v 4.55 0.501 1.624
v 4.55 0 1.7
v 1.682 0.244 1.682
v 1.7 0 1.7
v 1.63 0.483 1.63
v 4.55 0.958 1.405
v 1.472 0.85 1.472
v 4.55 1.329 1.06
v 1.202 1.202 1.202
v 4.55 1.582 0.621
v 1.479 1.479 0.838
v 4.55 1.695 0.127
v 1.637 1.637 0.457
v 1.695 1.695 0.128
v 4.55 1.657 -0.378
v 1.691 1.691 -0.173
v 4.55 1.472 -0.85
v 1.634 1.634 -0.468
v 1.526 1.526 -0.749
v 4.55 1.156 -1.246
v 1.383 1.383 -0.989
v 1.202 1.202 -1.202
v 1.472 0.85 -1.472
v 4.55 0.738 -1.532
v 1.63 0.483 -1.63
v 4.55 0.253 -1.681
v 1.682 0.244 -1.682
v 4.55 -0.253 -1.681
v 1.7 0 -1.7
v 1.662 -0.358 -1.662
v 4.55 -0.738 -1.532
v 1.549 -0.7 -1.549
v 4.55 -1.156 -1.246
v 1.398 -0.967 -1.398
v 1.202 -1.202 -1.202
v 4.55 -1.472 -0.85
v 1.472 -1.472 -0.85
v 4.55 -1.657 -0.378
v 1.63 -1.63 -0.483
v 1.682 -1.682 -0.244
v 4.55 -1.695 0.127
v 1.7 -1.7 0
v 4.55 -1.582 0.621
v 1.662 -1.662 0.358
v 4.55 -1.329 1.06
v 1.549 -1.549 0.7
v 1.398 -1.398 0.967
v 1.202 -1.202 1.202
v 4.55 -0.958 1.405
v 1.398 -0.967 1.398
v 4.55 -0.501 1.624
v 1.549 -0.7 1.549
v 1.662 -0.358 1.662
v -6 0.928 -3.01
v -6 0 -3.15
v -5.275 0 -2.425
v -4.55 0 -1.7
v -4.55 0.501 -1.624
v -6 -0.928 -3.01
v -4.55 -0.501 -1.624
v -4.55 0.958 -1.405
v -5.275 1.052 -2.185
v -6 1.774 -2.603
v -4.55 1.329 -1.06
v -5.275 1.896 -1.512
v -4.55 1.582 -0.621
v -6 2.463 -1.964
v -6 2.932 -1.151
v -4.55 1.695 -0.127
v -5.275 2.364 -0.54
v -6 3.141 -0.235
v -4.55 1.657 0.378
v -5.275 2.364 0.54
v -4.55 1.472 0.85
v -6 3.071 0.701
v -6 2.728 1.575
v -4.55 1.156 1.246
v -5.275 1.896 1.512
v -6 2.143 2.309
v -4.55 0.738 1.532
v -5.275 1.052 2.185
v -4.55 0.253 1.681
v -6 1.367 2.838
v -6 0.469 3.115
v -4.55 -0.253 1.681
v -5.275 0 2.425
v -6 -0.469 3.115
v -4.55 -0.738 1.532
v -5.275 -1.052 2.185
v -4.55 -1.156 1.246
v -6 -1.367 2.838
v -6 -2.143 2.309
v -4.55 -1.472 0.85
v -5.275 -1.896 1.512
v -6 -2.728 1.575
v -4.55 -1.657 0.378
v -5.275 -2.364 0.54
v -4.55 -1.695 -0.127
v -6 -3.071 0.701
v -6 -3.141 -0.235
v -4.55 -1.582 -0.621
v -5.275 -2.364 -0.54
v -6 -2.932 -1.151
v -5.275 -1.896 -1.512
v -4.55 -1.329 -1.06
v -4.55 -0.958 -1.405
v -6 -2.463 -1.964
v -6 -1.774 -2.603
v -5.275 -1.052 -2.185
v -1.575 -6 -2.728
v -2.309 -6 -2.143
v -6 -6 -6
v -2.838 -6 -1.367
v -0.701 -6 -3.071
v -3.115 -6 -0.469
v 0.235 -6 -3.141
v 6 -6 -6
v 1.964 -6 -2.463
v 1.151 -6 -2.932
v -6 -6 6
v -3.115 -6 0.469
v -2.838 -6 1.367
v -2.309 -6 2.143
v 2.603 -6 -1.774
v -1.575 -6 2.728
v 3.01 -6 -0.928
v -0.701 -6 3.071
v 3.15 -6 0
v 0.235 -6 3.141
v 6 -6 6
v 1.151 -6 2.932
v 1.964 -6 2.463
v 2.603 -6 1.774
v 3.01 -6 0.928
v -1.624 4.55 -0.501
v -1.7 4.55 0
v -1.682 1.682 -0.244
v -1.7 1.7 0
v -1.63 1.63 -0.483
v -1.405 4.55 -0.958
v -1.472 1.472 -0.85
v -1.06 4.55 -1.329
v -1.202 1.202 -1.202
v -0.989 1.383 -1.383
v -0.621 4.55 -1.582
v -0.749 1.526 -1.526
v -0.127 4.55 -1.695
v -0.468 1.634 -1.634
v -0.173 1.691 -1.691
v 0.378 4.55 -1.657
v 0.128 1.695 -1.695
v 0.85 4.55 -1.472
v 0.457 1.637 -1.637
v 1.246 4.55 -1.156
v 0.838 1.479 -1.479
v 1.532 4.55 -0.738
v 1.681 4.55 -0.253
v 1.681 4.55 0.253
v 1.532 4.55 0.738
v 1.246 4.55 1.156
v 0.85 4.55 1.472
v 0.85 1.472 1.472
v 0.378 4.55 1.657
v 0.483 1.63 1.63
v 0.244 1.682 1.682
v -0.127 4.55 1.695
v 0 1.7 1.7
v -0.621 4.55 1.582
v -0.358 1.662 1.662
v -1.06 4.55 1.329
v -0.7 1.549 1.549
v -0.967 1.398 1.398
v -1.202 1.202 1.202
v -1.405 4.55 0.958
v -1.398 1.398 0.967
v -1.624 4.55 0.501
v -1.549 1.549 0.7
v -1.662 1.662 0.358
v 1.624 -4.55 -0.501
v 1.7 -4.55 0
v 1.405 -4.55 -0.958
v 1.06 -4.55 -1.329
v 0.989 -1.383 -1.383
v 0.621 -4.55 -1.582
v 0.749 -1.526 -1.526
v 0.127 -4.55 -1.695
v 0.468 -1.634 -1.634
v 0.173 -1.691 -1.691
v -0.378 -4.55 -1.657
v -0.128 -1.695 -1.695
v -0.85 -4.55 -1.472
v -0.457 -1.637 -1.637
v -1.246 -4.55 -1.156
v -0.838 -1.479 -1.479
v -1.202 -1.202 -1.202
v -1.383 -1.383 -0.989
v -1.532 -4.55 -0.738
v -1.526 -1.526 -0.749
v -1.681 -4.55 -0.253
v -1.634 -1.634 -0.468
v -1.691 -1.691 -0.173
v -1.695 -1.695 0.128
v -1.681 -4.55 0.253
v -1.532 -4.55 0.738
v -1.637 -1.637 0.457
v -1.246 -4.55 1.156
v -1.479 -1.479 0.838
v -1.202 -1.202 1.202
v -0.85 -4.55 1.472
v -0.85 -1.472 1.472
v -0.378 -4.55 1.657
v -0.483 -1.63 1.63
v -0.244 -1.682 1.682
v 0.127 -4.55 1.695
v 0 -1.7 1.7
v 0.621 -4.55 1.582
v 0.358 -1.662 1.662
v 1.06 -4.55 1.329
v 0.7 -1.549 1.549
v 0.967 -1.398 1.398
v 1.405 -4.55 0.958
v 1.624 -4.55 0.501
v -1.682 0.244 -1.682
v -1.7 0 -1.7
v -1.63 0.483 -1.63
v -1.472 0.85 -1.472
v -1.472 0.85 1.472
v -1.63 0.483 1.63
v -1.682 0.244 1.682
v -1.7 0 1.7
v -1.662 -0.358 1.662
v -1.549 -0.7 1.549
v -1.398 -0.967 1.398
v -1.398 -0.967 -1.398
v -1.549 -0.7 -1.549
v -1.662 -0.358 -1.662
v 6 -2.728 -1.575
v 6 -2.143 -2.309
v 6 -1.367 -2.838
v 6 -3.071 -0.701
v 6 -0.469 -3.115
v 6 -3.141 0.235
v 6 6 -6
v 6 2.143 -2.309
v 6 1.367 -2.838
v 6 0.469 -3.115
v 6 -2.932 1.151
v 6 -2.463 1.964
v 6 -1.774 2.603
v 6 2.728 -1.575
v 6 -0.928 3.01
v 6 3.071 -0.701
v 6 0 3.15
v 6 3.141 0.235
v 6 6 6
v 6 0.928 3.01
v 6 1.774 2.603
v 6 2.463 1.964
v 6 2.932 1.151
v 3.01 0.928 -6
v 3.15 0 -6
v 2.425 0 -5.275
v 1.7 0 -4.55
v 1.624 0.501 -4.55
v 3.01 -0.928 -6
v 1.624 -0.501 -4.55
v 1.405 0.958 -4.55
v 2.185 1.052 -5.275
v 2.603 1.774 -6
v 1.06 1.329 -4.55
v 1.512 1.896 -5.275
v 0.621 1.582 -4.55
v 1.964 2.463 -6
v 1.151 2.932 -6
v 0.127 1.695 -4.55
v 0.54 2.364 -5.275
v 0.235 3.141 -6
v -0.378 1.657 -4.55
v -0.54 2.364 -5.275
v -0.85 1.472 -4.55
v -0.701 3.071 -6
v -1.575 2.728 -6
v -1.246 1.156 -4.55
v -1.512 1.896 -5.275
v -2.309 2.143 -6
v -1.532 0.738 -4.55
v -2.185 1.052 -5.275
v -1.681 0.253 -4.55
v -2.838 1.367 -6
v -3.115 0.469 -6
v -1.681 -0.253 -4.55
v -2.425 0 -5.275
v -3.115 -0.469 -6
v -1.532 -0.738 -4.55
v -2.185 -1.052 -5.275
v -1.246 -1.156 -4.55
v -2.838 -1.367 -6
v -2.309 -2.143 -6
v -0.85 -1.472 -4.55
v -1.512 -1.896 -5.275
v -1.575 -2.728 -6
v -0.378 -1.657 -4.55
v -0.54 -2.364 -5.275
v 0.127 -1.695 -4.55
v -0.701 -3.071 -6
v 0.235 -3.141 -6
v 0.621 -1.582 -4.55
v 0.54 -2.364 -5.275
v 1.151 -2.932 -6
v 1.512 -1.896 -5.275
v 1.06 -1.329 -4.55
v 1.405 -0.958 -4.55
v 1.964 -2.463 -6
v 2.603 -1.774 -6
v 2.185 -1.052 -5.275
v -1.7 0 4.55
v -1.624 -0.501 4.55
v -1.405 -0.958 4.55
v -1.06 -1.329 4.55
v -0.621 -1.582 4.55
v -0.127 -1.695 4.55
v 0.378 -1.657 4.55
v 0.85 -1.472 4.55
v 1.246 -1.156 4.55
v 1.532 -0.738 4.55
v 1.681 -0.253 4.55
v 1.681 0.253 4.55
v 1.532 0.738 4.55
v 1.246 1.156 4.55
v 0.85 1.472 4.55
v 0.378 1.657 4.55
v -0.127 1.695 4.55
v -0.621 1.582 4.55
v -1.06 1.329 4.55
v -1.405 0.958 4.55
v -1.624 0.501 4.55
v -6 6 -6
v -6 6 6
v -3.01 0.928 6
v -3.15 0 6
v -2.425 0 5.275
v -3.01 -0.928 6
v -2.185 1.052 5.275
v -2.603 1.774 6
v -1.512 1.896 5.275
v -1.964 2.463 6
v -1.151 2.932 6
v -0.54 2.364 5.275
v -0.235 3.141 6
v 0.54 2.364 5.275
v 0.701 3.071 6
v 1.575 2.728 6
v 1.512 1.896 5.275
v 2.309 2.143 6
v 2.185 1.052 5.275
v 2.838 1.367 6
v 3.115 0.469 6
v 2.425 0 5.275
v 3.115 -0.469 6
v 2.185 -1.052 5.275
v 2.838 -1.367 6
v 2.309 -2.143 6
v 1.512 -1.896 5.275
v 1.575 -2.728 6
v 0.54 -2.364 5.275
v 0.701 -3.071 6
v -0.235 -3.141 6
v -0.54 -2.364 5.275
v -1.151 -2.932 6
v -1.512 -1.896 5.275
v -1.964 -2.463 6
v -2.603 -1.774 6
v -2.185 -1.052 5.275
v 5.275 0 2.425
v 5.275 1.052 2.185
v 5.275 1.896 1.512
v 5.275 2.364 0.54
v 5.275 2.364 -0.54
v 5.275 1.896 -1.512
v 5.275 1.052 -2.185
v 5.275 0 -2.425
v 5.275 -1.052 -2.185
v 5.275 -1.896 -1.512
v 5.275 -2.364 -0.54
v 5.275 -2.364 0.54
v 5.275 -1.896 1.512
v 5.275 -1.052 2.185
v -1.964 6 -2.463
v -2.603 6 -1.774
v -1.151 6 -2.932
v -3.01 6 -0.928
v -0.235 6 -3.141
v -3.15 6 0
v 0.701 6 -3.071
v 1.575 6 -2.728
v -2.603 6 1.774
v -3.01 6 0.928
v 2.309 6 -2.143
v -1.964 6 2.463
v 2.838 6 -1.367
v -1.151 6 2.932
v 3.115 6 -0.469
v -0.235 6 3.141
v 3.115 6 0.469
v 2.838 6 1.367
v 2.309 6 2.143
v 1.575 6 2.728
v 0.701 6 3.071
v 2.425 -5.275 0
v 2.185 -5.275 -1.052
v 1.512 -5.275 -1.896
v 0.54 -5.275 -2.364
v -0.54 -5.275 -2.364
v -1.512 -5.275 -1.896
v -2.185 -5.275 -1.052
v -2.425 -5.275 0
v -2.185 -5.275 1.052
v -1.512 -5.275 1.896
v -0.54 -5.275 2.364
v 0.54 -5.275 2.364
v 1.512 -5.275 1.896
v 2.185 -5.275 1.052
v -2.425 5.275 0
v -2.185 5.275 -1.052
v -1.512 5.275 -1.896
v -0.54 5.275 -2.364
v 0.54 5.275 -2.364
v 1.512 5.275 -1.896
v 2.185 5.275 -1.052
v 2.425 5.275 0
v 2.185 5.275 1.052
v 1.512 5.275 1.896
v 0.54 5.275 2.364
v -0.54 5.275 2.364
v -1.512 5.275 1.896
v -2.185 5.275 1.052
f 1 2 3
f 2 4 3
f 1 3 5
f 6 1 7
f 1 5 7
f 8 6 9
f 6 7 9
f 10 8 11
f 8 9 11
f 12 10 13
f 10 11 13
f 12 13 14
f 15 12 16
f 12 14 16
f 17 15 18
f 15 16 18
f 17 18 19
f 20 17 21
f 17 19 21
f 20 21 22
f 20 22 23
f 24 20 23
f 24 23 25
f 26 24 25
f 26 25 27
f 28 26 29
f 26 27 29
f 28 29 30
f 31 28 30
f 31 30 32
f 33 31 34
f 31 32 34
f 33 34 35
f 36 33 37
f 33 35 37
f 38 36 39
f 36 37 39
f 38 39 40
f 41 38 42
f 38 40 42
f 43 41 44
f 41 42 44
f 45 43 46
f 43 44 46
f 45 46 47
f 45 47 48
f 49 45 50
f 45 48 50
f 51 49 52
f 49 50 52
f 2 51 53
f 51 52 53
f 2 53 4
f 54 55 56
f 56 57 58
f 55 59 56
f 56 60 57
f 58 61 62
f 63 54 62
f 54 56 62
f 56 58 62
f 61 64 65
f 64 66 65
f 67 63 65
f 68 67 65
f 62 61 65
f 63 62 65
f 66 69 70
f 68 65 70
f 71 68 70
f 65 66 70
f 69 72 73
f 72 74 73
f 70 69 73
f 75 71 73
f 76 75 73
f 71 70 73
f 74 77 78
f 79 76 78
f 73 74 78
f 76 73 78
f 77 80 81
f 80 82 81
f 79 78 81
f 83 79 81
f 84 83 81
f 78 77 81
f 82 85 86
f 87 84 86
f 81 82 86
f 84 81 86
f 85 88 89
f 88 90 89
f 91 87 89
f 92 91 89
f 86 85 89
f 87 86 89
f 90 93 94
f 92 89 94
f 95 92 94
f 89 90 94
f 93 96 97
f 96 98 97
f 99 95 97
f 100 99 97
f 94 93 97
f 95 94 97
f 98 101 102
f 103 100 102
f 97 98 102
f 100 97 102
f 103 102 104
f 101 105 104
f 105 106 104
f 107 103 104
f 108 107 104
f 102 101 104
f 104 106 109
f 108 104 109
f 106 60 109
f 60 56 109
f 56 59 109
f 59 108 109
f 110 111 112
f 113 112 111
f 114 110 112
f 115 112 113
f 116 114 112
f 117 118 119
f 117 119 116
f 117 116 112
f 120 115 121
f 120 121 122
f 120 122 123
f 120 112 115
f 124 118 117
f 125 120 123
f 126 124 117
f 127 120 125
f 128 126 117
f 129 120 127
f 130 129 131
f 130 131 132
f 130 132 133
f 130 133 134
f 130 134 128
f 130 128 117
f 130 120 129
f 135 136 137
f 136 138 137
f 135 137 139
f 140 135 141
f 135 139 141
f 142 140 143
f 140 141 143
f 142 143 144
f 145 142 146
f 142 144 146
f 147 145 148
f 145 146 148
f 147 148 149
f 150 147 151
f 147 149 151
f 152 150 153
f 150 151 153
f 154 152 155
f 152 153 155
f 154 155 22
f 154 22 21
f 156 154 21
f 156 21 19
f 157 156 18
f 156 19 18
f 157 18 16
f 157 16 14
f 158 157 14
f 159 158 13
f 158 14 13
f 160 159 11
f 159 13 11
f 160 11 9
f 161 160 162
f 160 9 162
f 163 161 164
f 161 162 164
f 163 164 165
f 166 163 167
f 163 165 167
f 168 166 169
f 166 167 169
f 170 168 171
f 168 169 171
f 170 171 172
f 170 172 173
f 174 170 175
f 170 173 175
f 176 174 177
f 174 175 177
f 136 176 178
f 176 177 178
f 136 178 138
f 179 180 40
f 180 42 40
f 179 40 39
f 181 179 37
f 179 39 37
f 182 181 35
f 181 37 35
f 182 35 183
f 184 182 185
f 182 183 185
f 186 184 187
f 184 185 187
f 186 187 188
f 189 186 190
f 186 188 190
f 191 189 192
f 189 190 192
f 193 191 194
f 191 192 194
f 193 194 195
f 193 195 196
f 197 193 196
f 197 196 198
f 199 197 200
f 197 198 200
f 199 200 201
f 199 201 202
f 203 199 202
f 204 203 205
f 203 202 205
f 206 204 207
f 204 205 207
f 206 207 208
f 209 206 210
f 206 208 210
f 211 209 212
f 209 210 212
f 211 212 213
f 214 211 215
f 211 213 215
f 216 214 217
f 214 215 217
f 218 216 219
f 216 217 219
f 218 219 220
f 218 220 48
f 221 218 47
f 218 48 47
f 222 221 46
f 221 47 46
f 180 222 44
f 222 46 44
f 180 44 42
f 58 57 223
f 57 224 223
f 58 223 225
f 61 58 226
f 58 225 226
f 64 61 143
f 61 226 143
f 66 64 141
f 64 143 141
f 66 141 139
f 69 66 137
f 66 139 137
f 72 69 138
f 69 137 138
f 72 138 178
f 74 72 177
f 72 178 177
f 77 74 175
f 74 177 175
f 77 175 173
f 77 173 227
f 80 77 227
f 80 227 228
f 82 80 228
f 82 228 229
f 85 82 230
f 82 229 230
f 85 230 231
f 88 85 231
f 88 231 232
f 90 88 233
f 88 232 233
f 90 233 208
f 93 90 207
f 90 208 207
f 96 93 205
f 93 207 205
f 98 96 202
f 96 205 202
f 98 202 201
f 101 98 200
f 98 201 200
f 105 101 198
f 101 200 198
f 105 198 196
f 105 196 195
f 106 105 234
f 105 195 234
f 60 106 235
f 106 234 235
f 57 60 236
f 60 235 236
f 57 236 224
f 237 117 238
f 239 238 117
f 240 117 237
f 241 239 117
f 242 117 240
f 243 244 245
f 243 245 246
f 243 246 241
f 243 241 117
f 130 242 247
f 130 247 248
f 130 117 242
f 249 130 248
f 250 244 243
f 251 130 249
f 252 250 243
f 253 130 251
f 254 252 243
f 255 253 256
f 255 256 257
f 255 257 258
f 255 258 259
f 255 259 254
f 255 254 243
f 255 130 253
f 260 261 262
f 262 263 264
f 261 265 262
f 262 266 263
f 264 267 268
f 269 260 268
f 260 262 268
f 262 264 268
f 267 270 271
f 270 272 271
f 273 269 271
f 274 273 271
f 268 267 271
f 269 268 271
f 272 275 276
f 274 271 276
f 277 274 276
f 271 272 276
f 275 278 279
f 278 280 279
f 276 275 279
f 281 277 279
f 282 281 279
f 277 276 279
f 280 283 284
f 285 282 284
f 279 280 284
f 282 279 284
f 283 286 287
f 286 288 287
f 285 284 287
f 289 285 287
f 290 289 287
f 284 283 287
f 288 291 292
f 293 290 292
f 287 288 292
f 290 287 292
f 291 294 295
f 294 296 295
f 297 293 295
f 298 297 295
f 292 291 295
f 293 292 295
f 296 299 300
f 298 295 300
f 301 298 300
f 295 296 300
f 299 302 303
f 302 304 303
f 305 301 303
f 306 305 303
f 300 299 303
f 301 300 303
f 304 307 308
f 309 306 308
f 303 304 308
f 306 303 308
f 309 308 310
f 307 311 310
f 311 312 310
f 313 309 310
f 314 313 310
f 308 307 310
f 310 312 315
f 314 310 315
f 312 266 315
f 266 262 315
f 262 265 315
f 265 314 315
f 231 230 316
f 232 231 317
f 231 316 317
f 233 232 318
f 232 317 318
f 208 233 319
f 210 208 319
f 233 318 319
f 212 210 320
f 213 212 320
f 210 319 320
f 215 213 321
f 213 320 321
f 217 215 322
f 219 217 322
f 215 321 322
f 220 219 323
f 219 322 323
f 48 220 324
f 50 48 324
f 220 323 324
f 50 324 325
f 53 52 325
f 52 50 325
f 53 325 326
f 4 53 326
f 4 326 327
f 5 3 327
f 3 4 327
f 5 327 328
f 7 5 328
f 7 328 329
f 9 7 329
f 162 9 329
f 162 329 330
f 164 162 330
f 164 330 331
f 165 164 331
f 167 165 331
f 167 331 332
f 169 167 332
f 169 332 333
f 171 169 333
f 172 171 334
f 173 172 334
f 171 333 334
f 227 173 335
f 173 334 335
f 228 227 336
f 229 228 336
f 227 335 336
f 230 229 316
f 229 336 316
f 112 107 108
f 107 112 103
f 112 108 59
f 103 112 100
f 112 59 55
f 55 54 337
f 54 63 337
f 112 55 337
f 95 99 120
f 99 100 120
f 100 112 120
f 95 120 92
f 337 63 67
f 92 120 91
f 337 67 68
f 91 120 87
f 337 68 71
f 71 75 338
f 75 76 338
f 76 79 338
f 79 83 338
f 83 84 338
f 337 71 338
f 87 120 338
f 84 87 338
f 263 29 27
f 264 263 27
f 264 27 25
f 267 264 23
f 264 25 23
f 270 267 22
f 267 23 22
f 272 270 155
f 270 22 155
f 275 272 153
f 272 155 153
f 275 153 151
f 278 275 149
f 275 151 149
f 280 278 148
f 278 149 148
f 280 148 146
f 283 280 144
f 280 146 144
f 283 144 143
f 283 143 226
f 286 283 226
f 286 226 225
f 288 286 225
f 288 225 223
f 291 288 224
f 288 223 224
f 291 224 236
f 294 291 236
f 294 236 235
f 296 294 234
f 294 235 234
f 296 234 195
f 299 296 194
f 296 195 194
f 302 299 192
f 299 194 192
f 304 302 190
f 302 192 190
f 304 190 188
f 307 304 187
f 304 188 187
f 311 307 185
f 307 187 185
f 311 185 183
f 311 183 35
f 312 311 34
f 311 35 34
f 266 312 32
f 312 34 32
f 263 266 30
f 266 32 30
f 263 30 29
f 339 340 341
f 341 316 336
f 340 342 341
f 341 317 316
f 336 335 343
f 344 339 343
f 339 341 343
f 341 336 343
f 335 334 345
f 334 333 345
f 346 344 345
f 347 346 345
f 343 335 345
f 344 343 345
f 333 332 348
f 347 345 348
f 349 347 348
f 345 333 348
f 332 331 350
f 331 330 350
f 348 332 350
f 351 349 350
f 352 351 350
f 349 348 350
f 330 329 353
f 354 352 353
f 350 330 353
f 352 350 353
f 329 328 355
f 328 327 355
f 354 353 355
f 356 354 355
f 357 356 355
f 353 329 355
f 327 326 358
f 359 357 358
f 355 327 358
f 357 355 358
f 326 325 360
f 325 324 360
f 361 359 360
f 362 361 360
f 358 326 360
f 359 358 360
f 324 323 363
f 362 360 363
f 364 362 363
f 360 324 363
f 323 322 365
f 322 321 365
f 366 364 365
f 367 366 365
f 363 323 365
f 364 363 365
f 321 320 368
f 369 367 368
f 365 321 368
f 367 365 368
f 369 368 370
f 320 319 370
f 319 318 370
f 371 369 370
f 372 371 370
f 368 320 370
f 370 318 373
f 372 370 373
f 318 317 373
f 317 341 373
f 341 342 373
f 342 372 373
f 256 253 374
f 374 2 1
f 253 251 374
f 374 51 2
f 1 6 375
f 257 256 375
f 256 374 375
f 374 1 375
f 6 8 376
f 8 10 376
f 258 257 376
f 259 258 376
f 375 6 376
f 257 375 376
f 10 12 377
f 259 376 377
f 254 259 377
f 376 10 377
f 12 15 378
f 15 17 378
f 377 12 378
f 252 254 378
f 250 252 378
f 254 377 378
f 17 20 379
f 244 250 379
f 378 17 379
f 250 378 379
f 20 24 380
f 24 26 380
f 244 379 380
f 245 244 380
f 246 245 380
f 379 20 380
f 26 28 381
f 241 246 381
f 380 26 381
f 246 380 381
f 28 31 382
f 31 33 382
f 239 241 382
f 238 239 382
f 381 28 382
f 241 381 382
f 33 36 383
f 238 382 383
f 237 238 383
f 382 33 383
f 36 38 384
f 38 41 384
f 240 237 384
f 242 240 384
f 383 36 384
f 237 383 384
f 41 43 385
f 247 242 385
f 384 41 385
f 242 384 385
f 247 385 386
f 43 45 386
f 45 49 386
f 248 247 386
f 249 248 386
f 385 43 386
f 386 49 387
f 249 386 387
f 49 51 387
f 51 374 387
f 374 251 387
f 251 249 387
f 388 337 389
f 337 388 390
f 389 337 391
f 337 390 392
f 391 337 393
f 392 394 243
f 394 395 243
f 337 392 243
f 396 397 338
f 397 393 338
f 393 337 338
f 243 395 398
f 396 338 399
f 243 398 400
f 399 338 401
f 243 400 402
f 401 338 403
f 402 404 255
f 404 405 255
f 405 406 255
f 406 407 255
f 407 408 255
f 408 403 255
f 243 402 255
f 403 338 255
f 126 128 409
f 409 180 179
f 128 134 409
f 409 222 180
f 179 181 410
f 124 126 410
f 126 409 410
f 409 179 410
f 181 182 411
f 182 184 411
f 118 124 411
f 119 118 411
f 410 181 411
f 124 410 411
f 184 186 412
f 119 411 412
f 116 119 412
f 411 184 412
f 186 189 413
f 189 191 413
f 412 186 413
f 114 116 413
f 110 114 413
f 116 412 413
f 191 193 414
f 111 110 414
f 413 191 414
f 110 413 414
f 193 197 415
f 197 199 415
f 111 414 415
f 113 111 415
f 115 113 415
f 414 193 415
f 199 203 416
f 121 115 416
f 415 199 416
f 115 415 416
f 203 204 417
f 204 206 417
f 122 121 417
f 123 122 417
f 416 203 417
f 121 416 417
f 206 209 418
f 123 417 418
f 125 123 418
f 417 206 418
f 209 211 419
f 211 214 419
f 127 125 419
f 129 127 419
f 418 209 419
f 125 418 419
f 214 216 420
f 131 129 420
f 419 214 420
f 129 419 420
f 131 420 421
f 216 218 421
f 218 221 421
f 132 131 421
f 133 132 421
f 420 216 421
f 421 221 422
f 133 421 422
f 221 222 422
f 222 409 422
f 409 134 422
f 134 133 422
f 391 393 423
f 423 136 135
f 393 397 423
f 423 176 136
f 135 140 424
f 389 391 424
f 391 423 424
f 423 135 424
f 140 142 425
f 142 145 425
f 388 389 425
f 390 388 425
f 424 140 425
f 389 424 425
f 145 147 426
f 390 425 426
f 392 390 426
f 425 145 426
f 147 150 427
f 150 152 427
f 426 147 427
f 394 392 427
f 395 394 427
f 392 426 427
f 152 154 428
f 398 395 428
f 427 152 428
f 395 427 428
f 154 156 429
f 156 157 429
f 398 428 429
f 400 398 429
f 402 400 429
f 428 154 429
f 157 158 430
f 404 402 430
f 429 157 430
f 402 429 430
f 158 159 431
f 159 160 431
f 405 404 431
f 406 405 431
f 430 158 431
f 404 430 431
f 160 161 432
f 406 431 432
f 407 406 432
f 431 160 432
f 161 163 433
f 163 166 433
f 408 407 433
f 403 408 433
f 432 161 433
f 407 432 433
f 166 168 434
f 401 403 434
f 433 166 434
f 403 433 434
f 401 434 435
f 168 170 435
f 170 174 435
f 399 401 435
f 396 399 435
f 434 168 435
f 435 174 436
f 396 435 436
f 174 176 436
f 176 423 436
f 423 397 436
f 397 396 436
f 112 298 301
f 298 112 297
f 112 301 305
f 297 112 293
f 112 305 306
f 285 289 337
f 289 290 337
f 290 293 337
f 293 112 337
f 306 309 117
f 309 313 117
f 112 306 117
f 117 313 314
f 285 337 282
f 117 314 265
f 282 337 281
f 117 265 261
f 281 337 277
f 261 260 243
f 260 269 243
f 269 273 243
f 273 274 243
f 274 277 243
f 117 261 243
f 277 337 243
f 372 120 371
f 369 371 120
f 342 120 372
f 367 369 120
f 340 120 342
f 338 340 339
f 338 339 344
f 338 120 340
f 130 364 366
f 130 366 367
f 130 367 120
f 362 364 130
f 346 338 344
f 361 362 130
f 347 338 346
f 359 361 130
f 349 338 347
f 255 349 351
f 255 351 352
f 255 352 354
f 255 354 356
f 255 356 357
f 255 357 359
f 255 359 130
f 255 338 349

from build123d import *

# Parameters (mm, degrees)
SKETCH1_W                                       = 12
SKETCH1_H                                       = 12
BOSS_EXTRUDE1_DEPTH                             = 6
CSK_FOR_M3_FLAT_HEAD_MACHINE_SCREW1_D           = 3.4
CSK_FOR_M3_FLAT_HEAD_MACHINE_SCREW1_DEPTH       = 6
CSK_FOR_M3_FLAT_HEAD_MACHINE_SCREW1_CSINK_D     = 6.3
CSK_FOR_M3_FLAT_HEAD_MACHINE_SCREW1_CSINK_ANGLE = 90
CSK_FOR_M3_FLAT_HEAD_MACHINE_SCREW1_TIP         = 1.021463052
CSK_FOR_M3_FLAT_HEAD_MACHINE_SCREW2_D           = 3.4
CSK_FOR_M3_FLAT_HEAD_MACHINE_SCREW2_DEPTH       = 6
CSK_FOR_M3_FLAT_HEAD_MACHINE_SCREW2_CSINK_D     = 6.3
CSK_FOR_M3_FLAT_HEAD_MACHINE_SCREW2_CSINK_ANGLE = 90
CSK_FOR_M3_FLAT_HEAD_MACHINE_SCREW2_TIP         = 1.021463052
CSK_FOR_M3_FLAT_HEAD_MACHINE_SCREW3_D           = 3.4
CSK_FOR_M3_FLAT_HEAD_MACHINE_SCREW3_DEPTH       = 6
CSK_FOR_M3_FLAT_HEAD_MACHINE_SCREW3_CSINK_D     = 6.3
CSK_FOR_M3_FLAT_HEAD_MACHINE_SCREW3_CSINK_ANGLE = 90
CSK_FOR_M3_FLAT_HEAD_MACHINE_SCREW3_TIP         = 1.021463052
CSK_FOR_M3_FLAT_HEAD_MACHINE_SCREW7_D           = 3.4
CSK_FOR_M3_FLAT_HEAD_MACHINE_SCREW7_DEPTH       = 6
CSK_FOR_M3_FLAT_HEAD_MACHINE_SCREW7_CSINK_D     = 6.3
CSK_FOR_M3_FLAT_HEAD_MACHINE_SCREW7_CSINK_ANGLE = 90
CSK_FOR_M3_FLAT_HEAD_MACHINE_SCREW7_TIP         = 1.021463052
CSK_FOR_M3_FLAT_HEAD_MACHINE_SCREW8_D           = 3.4
CSK_FOR_M3_FLAT_HEAD_MACHINE_SCREW8_DEPTH       = 6
CSK_FOR_M3_FLAT_HEAD_MACHINE_SCREW8_CSINK_D     = 6.3
CSK_FOR_M3_FLAT_HEAD_MACHINE_SCREW8_CSINK_ANGLE = 90
CSK_FOR_M3_FLAT_HEAD_MACHINE_SCREW8_TIP         = 1.021463052
CSK_FOR_M3_FLAT_HEAD_MACHINE_SCREW9_D           = 3.4
CSK_FOR_M3_FLAT_HEAD_MACHINE_SCREW9_DEPTH       = 6
CSK_FOR_M3_FLAT_HEAD_MACHINE_SCREW9_CSINK_D     = 6.3
CSK_FOR_M3_FLAT_HEAD_MACHINE_SCREW9_CSINK_ANGLE = 90
CSK_FOR_M3_FLAT_HEAD_MACHINE_SCREW9_TIP         = 1.021463052


with BuildPart() as part:
    # Sketch1 → Boss-Extrude1 (new, symmetric)
    with BuildSketch(Plane.XY):
        Rectangle(SKETCH1_W, SKETCH1_H)
    extrude(amount=BOSS_EXTRUDE1_DEPTH, both=True)

    # CSK for M3 Flat Head Machine Screw1
    with Locations(Plane.XY.offset(6)):
        with Locations((0, 0)):
            CounterSinkHole(CSK_FOR_M3_FLAT_HEAD_MACHINE_SCREW1_D / 2, CSK_FOR_M3_FLAT_HEAD_MACHINE_SCREW1_CSINK_D / 2, depth=CSK_FOR_M3_FLAT_HEAD_MACHINE_SCREW1_DEPTH, counter_sink_angle=CSK_FOR_M3_FLAT_HEAD_MACHINE_SCREW1_CSINK_ANGLE)
            with Locations((0, 0, -(CSK_FOR_M3_FLAT_HEAD_MACHINE_SCREW1_DEPTH + CSK_FOR_M3_FLAT_HEAD_MACHINE_SCREW1_TIP / 2))):  # 118° drill point
                Cone(0, CSK_FOR_M3_FLAT_HEAD_MACHINE_SCREW1_D / 2, CSK_FOR_M3_FLAT_HEAD_MACHINE_SCREW1_TIP, mode=Mode.SUBTRACT)

    # CSK for M3 Flat Head Machine Screw2
    with Locations(Plane(origin=(6, 0, 0), x_dir=(0, 0, -1), z_dir=(1, 0, 0))):
        with Locations((0, 0)):
            CounterSinkHole(CSK_FOR_M3_FLAT_HEAD_MACHINE_SCREW2_D / 2, CSK_FOR_M3_FLAT_HEAD_MACHINE_SCREW2_CSINK_D / 2, depth=CSK_FOR_M3_FLAT_HEAD_MACHINE_SCREW2_DEPTH, counter_sink_angle=CSK_FOR_M3_FLAT_HEAD_MACHINE_SCREW2_CSINK_ANGLE)
            with Locations((0, 0, -(CSK_FOR_M3_FLAT_HEAD_MACHINE_SCREW2_DEPTH + CSK_FOR_M3_FLAT_HEAD_MACHINE_SCREW2_TIP / 2))):  # 118° drill point
                Cone(0, CSK_FOR_M3_FLAT_HEAD_MACHINE_SCREW2_D / 2, CSK_FOR_M3_FLAT_HEAD_MACHINE_SCREW2_TIP, mode=Mode.SUBTRACT)

    # CSK for M3 Flat Head Machine Screw3
    with Locations(Plane(origin=(0, 0, -6), x_dir=(-1, 0, 0), z_dir=(0, 0, -1))):
        with Locations((0, 0)):
            CounterSinkHole(CSK_FOR_M3_FLAT_HEAD_MACHINE_SCREW3_D / 2, CSK_FOR_M3_FLAT_HEAD_MACHINE_SCREW3_CSINK_D / 2, depth=CSK_FOR_M3_FLAT_HEAD_MACHINE_SCREW3_DEPTH, counter_sink_angle=CSK_FOR_M3_FLAT_HEAD_MACHINE_SCREW3_CSINK_ANGLE)
            with Locations((0, 0, -(CSK_FOR_M3_FLAT_HEAD_MACHINE_SCREW3_DEPTH + CSK_FOR_M3_FLAT_HEAD_MACHINE_SCREW3_TIP / 2))):  # 118° drill point
                Cone(0, CSK_FOR_M3_FLAT_HEAD_MACHINE_SCREW3_D / 2, CSK_FOR_M3_FLAT_HEAD_MACHINE_SCREW3_TIP, mode=Mode.SUBTRACT)

    # CSK for M3 Flat Head Machine Screw7
    with Locations(Plane.ZY.offset(6)):
        with Locations((0, 0)):
            CounterSinkHole(CSK_FOR_M3_FLAT_HEAD_MACHINE_SCREW7_D / 2, CSK_FOR_M3_FLAT_HEAD_MACHINE_SCREW7_CSINK_D / 2, depth=CSK_FOR_M3_FLAT_HEAD_MACHINE_SCREW7_DEPTH, counter_sink_angle=CSK_FOR_M3_FLAT_HEAD_MACHINE_SCREW7_CSINK_ANGLE)
            with Locations((0, 0, -(CSK_FOR_M3_FLAT_HEAD_MACHINE_SCREW7_DEPTH + CSK_FOR_M3_FLAT_HEAD_MACHINE_SCREW7_TIP / 2))):  # 118° drill point
                Cone(0, CSK_FOR_M3_FLAT_HEAD_MACHINE_SCREW7_D / 2, CSK_FOR_M3_FLAT_HEAD_MACHINE_SCREW7_TIP, mode=Mode.SUBTRACT)

    # CSK for M3 Flat Head Machine Screw8
    with Locations(Plane(origin=(0, 6, 0), x_dir=(1, 0, 0), z_dir=(0, 1, 0))):
        with Locations((0, 0)):
            CounterSinkHole(CSK_FOR_M3_FLAT_HEAD_MACHINE_SCREW8_D / 2, CSK_FOR_M3_FLAT_HEAD_MACHINE_SCREW8_CSINK_D / 2, depth=CSK_FOR_M3_FLAT_HEAD_MACHINE_SCREW8_DEPTH, counter_sink_angle=CSK_FOR_M3_FLAT_HEAD_MACHINE_SCREW8_CSINK_ANGLE)
            with Locations((0, 0, -(CSK_FOR_M3_FLAT_HEAD_MACHINE_SCREW8_DEPTH + CSK_FOR_M3_FLAT_HEAD_MACHINE_SCREW8_TIP / 2))):  # 118° drill point
                Cone(0, CSK_FOR_M3_FLAT_HEAD_MACHINE_SCREW8_D / 2, CSK_FOR_M3_FLAT_HEAD_MACHINE_SCREW8_TIP, mode=Mode.SUBTRACT)

    # CSK for M3 Flat Head Machine Screw9
    with Locations(Plane(origin=(0, -6, 0), x_dir=(-1, 0, 0), z_dir=(0, -1, 0))):
        with Locations((0, 0)):
            CounterSinkHole(CSK_FOR_M3_FLAT_HEAD_MACHINE_SCREW9_D / 2, CSK_FOR_M3_FLAT_HEAD_MACHINE_SCREW9_CSINK_D / 2, depth=CSK_FOR_M3_FLAT_HEAD_MACHINE_SCREW9_DEPTH, counter_sink_angle=CSK_FOR_M3_FLAT_HEAD_MACHINE_SCREW9_CSINK_ANGLE)
            with Locations((0, 0, -(CSK_FOR_M3_FLAT_HEAD_MACHINE_SCREW9_DEPTH + CSK_FOR_M3_FLAT_HEAD_MACHINE_SCREW9_TIP / 2))):  # 118° drill point
                Cone(0, CSK_FOR_M3_FLAT_HEAD_MACHINE_SCREW9_D / 2, CSK_FOR_M3_FLAT_HEAD_MACHINE_SCREW9_TIP, mode=Mode.SUBTRACT)


solid = part.part
